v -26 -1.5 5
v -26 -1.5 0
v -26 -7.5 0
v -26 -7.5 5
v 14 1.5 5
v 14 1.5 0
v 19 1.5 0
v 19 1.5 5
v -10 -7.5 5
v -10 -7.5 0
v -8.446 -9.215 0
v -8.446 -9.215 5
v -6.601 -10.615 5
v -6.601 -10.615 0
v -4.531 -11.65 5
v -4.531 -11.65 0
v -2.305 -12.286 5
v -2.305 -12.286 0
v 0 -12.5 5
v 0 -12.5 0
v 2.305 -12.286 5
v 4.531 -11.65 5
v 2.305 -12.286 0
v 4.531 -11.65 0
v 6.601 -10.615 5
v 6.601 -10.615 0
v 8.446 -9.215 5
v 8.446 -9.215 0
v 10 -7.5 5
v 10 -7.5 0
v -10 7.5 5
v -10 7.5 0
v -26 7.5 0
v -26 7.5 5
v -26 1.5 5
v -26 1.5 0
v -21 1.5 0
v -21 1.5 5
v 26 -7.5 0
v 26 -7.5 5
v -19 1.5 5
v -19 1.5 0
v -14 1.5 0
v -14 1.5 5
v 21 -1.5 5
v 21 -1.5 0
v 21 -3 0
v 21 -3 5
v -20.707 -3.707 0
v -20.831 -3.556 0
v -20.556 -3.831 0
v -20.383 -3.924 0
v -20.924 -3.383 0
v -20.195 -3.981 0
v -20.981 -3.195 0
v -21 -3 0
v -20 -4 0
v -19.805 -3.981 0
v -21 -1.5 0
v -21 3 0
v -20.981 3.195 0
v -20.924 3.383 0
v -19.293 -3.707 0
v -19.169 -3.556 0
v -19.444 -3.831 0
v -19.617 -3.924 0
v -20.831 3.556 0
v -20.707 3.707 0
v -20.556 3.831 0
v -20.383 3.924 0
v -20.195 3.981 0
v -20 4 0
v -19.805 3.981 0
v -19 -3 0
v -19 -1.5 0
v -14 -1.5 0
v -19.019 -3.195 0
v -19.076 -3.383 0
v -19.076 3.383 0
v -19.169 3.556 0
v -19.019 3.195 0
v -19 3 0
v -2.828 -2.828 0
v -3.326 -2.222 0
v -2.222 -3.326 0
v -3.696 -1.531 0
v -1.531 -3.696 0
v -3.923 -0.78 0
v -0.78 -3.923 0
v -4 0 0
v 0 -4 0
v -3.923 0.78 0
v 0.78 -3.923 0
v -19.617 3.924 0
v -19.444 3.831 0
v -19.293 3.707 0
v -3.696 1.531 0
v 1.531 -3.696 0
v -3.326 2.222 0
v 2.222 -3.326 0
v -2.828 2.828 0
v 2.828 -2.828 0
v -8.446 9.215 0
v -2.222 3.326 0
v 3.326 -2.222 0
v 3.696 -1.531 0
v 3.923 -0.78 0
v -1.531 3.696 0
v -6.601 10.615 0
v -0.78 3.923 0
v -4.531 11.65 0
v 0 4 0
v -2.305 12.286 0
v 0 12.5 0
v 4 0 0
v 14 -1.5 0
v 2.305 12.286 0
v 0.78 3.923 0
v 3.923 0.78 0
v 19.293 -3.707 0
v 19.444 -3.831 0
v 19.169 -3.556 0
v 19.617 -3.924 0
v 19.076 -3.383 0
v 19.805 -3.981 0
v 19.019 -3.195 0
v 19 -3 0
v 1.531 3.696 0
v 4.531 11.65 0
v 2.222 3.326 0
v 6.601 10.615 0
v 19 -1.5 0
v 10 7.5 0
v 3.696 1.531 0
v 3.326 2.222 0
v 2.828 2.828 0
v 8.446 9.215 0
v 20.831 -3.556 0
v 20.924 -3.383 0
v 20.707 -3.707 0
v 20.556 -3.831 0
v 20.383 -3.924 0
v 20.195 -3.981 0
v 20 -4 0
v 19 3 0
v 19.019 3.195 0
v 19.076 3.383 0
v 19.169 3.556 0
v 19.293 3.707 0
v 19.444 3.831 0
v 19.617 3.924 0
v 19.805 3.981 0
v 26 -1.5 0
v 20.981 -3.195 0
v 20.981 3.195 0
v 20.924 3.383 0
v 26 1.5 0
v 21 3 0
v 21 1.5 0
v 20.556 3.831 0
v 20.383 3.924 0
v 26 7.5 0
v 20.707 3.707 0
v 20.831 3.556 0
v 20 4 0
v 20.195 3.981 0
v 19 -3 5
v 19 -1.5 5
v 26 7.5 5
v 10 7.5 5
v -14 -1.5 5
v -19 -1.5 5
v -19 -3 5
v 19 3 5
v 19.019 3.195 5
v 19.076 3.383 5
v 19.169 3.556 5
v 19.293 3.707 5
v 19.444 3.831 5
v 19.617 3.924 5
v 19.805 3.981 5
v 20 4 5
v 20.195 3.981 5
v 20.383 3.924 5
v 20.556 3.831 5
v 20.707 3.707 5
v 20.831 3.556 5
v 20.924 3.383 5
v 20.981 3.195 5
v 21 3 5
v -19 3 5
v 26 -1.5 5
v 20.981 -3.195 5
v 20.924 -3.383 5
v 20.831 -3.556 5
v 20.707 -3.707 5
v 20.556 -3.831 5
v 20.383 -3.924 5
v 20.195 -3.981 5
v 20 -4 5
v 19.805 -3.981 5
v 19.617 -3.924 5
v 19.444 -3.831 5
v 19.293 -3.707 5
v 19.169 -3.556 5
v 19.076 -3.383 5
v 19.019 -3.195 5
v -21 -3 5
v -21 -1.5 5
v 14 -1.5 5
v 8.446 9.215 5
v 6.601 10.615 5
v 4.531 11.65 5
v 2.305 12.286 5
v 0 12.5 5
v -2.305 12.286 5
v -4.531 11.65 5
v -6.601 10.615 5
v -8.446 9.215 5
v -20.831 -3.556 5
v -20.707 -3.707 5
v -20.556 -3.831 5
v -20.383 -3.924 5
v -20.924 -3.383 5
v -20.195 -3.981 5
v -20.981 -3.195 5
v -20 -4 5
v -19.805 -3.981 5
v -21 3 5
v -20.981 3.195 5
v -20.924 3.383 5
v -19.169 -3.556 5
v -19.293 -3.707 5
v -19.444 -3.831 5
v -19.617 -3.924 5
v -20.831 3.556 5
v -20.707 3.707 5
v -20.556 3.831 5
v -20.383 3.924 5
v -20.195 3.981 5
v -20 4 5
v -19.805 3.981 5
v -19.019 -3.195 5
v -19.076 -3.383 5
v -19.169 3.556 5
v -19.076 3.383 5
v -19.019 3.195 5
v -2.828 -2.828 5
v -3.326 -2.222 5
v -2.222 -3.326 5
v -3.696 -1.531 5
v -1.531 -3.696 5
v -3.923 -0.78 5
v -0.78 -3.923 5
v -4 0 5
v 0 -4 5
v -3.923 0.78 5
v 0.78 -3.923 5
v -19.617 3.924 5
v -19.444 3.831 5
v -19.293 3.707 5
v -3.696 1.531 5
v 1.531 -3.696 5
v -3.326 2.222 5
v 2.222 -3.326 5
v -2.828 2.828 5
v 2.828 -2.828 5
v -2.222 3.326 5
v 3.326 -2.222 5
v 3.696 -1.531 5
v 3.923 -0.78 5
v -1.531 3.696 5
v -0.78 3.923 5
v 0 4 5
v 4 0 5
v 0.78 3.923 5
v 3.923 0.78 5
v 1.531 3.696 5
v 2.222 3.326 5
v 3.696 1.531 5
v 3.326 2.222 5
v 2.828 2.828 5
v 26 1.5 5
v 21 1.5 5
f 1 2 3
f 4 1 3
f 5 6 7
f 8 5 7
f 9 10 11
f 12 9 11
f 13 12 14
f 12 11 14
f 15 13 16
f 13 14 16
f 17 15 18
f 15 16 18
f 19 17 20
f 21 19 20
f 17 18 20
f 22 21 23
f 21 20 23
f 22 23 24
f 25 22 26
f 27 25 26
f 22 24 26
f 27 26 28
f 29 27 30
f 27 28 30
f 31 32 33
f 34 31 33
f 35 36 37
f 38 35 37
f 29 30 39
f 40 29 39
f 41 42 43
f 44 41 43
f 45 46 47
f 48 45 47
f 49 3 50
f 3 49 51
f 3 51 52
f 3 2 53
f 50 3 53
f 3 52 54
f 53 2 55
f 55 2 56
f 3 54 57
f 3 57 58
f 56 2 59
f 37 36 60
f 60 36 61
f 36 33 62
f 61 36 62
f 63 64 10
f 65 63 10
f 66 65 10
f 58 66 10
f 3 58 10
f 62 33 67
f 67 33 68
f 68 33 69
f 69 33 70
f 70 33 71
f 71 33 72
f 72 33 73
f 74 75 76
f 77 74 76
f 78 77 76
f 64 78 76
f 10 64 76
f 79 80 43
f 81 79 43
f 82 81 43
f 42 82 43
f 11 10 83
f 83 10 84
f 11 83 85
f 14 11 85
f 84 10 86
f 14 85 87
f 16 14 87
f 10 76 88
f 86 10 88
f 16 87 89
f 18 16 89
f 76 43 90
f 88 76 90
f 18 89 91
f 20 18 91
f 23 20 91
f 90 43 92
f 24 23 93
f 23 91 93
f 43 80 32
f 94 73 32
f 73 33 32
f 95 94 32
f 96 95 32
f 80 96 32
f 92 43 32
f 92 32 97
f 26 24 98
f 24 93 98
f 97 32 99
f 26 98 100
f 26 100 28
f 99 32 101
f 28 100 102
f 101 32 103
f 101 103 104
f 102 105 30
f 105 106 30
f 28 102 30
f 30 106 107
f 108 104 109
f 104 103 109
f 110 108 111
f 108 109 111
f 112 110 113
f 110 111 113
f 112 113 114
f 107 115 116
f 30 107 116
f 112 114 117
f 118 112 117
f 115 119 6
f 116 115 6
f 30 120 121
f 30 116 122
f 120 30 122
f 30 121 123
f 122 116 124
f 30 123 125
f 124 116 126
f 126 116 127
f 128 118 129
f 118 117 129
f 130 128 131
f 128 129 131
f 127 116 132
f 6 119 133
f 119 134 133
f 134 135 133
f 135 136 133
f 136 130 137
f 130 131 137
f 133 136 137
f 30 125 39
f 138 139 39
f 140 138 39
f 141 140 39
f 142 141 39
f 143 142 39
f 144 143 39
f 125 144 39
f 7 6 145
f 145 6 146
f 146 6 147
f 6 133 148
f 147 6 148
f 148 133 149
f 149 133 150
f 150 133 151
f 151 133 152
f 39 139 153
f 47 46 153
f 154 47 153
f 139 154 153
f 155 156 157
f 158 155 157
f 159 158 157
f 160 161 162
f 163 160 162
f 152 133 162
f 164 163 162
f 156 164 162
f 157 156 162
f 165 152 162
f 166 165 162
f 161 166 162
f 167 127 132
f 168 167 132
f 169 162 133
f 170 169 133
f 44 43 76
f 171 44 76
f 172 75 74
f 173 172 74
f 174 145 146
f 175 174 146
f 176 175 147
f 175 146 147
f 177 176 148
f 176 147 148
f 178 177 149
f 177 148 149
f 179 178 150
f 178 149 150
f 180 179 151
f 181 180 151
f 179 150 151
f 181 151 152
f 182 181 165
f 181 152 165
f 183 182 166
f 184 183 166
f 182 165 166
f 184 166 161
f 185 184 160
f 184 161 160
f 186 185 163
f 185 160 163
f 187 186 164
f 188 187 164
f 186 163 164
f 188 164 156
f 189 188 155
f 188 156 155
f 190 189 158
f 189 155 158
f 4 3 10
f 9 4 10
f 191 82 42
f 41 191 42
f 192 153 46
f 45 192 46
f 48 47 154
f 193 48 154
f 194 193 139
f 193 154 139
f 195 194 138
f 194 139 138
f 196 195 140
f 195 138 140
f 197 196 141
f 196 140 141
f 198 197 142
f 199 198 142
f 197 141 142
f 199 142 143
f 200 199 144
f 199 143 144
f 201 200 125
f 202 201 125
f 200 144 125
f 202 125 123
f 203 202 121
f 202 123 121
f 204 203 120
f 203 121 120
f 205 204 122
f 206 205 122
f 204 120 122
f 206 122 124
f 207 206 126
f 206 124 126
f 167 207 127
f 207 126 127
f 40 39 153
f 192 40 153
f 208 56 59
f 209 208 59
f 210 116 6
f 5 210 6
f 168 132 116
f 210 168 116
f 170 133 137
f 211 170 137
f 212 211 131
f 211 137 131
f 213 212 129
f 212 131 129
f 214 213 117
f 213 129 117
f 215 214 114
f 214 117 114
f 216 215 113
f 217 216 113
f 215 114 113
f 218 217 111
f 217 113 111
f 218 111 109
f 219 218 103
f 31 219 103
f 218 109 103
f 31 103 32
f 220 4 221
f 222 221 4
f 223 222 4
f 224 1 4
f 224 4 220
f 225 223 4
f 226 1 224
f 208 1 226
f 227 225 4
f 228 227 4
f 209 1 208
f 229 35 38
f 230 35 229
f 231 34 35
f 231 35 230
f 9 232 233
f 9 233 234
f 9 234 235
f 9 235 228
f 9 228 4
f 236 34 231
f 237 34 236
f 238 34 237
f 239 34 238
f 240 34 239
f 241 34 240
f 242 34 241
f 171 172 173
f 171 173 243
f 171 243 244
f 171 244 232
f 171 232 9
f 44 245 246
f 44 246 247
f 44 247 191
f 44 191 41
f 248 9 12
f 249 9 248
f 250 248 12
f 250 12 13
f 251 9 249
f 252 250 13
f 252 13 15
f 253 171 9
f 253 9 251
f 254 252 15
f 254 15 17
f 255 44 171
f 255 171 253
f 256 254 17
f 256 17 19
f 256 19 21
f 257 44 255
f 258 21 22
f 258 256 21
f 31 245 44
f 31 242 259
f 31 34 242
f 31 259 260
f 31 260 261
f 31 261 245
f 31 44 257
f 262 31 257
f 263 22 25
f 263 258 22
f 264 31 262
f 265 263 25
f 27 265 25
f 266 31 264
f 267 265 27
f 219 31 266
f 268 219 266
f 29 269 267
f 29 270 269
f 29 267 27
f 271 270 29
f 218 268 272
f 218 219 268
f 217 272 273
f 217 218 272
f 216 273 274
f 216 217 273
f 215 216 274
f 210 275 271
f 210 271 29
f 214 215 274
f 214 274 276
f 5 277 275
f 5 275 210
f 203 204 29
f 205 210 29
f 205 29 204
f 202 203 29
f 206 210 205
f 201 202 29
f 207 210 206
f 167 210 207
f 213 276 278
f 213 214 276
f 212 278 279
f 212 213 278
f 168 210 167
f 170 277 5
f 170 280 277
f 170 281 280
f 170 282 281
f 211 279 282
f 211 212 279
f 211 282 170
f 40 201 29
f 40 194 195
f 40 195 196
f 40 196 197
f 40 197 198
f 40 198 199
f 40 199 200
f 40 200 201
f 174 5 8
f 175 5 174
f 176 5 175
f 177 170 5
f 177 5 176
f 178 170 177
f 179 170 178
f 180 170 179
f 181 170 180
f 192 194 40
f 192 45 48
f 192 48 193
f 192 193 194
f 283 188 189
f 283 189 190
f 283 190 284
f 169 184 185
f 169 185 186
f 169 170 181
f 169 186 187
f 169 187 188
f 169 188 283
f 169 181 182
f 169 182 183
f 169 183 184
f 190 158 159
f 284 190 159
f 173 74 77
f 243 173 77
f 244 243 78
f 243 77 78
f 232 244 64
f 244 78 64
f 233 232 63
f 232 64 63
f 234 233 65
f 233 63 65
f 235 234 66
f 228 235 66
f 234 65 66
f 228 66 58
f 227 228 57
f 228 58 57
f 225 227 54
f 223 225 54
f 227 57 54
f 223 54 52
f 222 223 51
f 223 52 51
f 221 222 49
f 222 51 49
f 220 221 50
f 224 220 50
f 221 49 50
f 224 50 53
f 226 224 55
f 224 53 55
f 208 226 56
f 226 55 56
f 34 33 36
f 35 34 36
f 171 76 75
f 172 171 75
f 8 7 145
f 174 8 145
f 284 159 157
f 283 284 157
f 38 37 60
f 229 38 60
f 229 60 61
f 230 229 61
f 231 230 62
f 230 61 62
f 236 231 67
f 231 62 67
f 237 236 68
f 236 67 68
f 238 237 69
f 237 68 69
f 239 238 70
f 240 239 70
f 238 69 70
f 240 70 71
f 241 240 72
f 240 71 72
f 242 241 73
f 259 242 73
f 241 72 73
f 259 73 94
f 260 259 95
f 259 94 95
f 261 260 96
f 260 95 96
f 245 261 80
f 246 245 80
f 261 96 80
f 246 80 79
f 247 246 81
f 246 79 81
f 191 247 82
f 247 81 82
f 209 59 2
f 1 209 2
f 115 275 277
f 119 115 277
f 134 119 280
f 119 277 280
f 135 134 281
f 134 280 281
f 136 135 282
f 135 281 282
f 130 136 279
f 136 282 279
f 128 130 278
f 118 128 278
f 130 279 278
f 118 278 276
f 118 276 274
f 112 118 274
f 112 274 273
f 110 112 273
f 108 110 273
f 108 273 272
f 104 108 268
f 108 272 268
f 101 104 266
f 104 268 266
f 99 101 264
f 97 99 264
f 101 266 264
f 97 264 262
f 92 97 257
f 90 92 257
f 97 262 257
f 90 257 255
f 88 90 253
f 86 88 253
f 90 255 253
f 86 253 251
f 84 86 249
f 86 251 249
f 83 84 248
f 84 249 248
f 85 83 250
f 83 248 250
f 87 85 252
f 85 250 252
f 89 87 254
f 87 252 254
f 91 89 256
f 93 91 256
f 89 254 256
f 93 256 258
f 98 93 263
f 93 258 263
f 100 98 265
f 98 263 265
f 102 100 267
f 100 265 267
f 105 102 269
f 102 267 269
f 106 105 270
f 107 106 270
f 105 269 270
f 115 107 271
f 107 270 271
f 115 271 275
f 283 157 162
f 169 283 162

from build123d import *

# Parameters (mm, degrees)
BOSS_EXTRUDE1_DEPTH = 5
SKETCH2_R           = 4
CUT_EXTRUDE1_DEPTH  = 5


with BuildPart() as part:
    # Sketch1 → Boss-Extrude1 (new body)
    with BuildSketch(Plane.XY):
        with BuildLine():
            Line((-10, -7.5), (10, -7.5))
            ThreePointArc((10, -7.5), (11.858541226, -3.952847075), (12.5, 0))
            ThreePointArc((12.5, 0), (11.858541226, 3.952847075), (10, 7.5))
            Line((10, 7.5), (-10, 7.5))
            ThreePointArc((-10, 7.5), (-12.5, 0), (-10, -7.5))
        make_face()
        with BuildLine():
            ThreePointArc((10, 7.5), (0, 12.5), (-10, 7.5))
            Line((-10, 7.5), (10, 7.5))
        make_face()
        with BuildLine():
            ThreePointArc((-10, -7.5), (0, -12.5), (10, -7.5))
            Line((10, -7.5), (-10, -7.5))
        make_face()
        with BuildLine():
            Line((-26, -7.5), (-10, -7.5))
            ThreePointArc((-10, -7.5), (-12.5, 0), (-10, 7.5))
            Line((-10, 7.5), (-26, 7.5))
            Line((-26, 7.5), (-26, 1.5))
            Line((-26, 1.5), (-21, 1.5))
            Line((-21, 1.5), (-21, 3))
            ThreePointArc((-21, 3), (-20, 4), (-19, 3))
            Line((-19, 3), (-19, 1.5))
            Line((-19, 1.5), (-14, 1.5))
            Line((-14, 1.5), (-14, -1.5))
            Line((-14, -1.5), (-19, -1.5))
            Line((-19, -1.5), (-19, -3))
            ThreePointArc((-19, -3), (-20, -4), (-21, -3))
            Line((-21, -3), (-21, -1.5))
            Line((-21, -1.5), (-26, -1.5))
            Line((-26, -1.5), (-26, -7.5))
        make_face()
        with BuildLine():
            Line((10, -7.5), (26, -7.5))
            Line((26, -7.5), (26, -1.5))
            Line((26, -1.5), (21, -1.5))
            Line((21, -1.5), (21, -3))
            ThreePointArc((21, -3), (20, -4), (19, -3))
            Line((19, -3), (19, -1.5))
            Line((19, -1.5), (14, -1.5))
            Line((14, -1.5), (14, 1.5))
            Line((14, 1.5), (19, 1.5))
            Line((19, 1.5), (19, 3))
            ThreePointArc((19, 3), (20, 4), (21, 3))
            Line((21, 3), (21, 1.5))
            Line((21, 1.5), (26, 1.5))
            Line((26, 1.5), (26, 7.5))
            Line((26, 7.5), (10, 7.5))
            ThreePointArc((10, 7.5), (11.858541226, 3.952847075), (12.5, 0))
            ThreePointArc((12.5, 0), (11.858541226, -3.952847075), (10, -7.5))
        make_face()
    extrude(amount=BOSS_EXTRUDE1_DEPTH)

    # Sketch2 → Cut-Extrude1 (cut)
    with BuildSketch(Plane.XY.offset(5)):
        Circle(SKETCH2_R)
    extrude(amount=-CUT_EXTRUDE1_DEPTH, mode=Mode.SUBTRACT)


solid = part.part
